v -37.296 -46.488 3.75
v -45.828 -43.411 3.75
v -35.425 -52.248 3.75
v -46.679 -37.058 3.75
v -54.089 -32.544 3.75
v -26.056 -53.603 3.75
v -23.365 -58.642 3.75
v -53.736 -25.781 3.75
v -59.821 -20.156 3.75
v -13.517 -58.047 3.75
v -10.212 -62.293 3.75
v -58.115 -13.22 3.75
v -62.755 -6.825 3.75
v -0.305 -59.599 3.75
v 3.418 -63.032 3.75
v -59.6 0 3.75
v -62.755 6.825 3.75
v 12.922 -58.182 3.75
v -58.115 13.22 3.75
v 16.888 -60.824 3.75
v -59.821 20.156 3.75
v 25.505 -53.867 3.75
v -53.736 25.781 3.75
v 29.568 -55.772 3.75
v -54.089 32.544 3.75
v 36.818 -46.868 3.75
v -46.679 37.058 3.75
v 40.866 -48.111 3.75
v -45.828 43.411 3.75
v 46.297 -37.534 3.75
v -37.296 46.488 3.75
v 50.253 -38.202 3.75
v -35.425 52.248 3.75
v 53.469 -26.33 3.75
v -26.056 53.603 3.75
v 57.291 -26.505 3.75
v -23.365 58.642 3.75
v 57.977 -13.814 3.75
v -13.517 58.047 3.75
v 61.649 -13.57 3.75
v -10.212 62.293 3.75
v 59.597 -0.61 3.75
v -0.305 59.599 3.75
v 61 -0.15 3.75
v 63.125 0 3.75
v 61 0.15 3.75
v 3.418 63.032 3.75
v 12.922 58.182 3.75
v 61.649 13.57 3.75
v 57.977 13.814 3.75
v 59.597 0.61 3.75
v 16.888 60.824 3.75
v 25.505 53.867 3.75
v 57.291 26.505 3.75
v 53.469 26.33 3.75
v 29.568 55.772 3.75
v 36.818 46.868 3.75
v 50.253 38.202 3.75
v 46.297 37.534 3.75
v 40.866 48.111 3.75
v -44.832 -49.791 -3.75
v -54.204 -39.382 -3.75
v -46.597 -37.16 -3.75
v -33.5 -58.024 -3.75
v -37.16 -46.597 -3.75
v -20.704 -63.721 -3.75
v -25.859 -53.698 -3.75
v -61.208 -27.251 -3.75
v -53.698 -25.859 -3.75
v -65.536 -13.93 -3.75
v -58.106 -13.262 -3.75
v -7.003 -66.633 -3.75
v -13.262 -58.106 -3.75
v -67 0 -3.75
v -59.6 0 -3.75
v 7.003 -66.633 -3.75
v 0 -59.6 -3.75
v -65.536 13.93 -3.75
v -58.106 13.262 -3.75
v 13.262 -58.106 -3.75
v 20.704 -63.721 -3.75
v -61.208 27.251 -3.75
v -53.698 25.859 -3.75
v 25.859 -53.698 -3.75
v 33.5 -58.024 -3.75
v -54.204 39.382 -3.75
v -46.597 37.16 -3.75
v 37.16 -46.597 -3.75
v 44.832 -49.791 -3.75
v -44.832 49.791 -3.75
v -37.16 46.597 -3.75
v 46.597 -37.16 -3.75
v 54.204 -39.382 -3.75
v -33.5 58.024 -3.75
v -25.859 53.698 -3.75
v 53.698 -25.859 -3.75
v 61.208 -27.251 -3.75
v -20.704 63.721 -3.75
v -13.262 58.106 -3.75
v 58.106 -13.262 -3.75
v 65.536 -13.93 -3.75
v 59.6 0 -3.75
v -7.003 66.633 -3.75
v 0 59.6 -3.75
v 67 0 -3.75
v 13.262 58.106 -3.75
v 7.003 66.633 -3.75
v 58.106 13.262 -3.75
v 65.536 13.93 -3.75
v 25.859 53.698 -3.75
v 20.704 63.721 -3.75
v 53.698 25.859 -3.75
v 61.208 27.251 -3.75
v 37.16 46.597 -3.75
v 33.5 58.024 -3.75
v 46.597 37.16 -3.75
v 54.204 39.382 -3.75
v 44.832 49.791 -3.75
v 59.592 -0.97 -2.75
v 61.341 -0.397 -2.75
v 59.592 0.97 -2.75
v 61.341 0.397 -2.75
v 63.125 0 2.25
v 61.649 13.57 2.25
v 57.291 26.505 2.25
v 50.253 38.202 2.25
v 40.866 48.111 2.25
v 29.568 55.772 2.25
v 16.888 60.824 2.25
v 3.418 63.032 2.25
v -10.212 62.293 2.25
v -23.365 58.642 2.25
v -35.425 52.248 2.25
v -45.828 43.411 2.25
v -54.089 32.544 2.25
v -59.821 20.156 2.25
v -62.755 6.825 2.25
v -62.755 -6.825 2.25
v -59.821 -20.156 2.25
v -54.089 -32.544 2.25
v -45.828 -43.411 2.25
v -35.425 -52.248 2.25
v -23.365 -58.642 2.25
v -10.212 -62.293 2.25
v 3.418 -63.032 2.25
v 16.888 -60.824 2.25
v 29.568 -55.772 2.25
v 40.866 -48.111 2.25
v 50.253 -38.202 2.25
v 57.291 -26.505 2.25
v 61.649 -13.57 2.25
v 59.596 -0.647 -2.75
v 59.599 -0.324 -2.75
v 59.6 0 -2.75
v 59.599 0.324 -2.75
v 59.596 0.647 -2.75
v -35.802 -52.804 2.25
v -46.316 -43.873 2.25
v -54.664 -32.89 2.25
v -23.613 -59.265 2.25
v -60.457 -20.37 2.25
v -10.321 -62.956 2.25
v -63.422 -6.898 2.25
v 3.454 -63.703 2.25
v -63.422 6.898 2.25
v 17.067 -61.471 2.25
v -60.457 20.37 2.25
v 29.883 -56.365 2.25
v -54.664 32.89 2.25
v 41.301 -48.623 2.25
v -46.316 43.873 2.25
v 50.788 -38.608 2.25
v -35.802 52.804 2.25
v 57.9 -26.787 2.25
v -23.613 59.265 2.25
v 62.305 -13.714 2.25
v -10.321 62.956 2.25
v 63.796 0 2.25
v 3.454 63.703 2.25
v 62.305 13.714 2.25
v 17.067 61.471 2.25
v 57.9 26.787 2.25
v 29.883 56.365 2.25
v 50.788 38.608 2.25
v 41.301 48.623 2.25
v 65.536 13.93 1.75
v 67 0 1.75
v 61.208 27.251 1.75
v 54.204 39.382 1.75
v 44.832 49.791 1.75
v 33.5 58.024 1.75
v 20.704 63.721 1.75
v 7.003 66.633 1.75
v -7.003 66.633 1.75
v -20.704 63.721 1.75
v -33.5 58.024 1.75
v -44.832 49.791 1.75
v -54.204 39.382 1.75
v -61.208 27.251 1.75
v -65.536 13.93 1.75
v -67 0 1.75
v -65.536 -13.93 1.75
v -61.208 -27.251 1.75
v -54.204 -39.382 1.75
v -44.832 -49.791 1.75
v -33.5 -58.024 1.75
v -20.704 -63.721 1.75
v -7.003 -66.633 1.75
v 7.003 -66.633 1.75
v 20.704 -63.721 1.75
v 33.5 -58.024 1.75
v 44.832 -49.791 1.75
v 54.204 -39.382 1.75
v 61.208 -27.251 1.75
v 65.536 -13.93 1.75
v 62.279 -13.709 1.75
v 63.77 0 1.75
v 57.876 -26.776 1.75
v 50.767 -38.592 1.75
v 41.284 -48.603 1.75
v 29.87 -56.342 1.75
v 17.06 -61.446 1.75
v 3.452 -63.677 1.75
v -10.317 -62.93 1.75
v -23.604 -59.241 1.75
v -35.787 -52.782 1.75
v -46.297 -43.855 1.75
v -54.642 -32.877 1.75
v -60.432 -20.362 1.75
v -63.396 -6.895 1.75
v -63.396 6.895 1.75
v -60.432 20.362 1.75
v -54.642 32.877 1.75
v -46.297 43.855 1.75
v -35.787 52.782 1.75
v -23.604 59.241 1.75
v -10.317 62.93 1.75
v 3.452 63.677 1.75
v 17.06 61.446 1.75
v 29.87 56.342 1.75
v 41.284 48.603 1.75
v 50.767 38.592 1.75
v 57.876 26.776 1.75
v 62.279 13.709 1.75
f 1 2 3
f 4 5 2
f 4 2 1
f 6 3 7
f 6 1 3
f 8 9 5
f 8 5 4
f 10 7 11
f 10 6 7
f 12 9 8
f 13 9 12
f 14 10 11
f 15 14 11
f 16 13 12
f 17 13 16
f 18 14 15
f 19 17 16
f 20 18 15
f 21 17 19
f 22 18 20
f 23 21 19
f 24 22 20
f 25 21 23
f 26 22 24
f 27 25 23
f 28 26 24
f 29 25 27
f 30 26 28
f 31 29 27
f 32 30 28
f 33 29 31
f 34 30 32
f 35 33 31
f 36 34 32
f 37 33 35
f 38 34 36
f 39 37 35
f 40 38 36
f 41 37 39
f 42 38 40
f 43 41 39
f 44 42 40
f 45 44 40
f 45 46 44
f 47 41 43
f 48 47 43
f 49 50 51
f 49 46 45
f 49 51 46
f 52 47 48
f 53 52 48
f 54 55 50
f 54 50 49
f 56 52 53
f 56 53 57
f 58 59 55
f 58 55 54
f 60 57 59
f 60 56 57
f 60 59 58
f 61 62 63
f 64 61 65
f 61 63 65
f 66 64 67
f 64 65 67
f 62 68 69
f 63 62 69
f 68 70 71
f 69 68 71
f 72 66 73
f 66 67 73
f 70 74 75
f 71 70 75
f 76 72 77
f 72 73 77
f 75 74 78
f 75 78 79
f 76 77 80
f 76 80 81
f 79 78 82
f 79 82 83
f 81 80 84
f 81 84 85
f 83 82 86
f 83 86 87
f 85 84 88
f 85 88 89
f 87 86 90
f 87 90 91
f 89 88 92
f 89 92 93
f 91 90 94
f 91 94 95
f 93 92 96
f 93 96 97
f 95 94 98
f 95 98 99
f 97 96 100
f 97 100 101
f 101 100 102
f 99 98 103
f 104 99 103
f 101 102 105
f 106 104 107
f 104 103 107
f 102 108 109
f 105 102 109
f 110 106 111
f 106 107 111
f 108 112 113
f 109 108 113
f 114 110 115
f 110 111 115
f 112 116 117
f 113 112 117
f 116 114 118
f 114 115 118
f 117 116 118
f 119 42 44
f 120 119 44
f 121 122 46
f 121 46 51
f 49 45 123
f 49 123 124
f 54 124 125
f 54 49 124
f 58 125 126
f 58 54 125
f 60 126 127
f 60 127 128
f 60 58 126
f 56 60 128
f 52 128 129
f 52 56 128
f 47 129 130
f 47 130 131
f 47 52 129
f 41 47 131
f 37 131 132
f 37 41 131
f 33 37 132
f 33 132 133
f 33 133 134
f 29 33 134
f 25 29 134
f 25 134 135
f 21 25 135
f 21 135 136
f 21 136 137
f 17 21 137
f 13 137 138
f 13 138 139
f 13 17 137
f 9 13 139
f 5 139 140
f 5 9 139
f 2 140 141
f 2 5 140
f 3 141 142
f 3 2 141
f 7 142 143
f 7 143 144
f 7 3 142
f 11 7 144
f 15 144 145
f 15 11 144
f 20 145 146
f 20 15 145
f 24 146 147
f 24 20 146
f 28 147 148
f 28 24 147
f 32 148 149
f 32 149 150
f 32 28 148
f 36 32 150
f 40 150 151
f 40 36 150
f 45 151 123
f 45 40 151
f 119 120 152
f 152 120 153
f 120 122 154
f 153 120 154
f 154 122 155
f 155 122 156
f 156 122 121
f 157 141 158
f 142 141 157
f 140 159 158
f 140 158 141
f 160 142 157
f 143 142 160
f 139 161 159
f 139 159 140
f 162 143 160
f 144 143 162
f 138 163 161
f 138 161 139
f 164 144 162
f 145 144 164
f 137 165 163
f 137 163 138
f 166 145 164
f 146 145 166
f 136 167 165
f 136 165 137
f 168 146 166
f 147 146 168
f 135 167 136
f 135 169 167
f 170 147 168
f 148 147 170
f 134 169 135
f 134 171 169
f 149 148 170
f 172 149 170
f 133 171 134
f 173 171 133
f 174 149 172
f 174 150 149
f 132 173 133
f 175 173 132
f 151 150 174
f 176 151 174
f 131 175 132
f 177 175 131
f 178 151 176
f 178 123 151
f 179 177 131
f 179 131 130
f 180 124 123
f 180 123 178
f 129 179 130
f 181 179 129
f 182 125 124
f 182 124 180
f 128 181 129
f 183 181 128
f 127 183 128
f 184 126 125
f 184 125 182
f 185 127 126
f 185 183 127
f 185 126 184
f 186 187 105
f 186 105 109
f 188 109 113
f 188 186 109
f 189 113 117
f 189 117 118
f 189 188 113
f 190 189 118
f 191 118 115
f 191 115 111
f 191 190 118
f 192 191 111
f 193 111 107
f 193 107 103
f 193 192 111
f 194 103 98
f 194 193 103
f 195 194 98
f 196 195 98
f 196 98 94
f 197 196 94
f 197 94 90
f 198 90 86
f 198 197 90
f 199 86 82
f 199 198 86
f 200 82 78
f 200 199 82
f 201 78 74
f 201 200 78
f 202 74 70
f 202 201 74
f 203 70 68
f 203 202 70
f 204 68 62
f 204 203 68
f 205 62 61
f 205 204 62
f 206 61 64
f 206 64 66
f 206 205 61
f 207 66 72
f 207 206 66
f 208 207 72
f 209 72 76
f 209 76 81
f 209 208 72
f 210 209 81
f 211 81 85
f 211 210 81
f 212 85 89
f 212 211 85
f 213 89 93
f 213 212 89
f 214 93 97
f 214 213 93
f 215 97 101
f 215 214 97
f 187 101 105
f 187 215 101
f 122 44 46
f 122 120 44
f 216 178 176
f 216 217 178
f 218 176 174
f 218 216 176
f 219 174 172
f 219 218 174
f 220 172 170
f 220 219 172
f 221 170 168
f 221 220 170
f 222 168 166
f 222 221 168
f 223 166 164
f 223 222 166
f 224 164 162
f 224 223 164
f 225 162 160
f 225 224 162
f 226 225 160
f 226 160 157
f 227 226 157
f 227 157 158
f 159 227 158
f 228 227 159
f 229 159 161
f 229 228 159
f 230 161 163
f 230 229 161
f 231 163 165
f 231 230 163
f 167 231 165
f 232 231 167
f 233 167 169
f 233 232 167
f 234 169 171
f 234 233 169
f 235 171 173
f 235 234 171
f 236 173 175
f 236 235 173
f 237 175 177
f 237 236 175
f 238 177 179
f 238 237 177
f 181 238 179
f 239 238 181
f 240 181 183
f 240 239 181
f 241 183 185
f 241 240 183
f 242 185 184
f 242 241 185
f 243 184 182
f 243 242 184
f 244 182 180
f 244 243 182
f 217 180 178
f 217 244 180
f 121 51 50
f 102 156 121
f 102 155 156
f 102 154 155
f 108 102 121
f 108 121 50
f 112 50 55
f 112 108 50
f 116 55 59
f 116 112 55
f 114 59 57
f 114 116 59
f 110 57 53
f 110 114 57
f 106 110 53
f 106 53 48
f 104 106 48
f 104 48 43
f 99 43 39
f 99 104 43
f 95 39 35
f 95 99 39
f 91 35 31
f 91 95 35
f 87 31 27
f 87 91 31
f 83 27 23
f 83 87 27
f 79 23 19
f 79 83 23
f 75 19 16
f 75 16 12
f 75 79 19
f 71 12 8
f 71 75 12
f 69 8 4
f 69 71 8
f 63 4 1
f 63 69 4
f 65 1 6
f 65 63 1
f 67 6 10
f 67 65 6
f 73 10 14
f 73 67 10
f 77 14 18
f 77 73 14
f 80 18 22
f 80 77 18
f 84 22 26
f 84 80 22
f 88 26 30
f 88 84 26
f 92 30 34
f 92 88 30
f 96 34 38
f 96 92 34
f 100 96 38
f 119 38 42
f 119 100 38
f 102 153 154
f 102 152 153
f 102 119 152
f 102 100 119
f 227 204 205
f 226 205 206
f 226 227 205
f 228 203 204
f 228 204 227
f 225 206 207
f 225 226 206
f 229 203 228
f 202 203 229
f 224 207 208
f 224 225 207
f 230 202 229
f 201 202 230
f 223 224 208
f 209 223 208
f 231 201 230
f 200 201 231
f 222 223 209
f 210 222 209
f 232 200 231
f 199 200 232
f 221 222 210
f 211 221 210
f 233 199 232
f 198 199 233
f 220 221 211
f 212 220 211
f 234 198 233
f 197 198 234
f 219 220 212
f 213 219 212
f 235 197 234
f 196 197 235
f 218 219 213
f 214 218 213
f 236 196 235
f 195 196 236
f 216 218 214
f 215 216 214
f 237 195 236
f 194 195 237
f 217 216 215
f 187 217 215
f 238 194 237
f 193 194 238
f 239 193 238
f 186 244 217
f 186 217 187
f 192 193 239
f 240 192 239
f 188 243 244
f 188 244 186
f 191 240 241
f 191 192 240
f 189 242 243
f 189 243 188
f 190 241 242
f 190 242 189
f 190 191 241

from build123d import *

# Parameters (mm, degrees)
F0_R        = 67
F0_R_2      = 59.6
F1_DEPTH    = 3.75
F2_R        = 63.875
F2_R_2      = 63.125
F3_DEPTH    = 1.5
F3_FACE_R   = 67
F3_FACE_R_2 = 63.875
F4_DEPTH    = 2
F4_TAPER    = -3
F7_DEPTH    = 6.5
F7_TAPER    = -3


# Not quite as in the source:
# - a feature of the source that left no trace in its solid (it failed there, or was rolled back) is left out


with BuildPart() as f1:
    # F0 (on Top) → F1 (new body, symmetric)
    with BuildSketch(Plane.XY):
        Circle(F0_R)
        Circle(F0_R_2, mode=Mode.SUBTRACT)
    extrude(amount=F1_DEPTH, both=True)

    # F2 (on face) → F3 (cut)
    with BuildSketch(Plane.XY.offset(3.75)):
        Circle(F2_R)
        Circle(F2_R_2, mode=Mode.SUBTRACT)
    extrude(amount=-F3_DEPTH, mode=Mode.SUBTRACT)

    # F3_face (on face) → F4 (cut)
    with BuildSketch(Plane.XY.offset(3.75)):
        Circle(F3_FACE_R)
        Circle(F3_FACE_R_2, mode=Mode.SUBTRACT)
    extrude(amount=-F4_DEPTH, taper=F4_TAPER, mode=Mode.SUBTRACT)

    # F6 (on face) → F7 (cut)
    with BuildSketch(Plane.XY.offset(3.75)):
        Polygon((61, 0.15), (59.4, 0.675), (59.4, -0.675), (61, -0.15), align=None)
    extrude(amount=-F7_DEPTH, taper=F7_TAPER, mode=Mode.SUBTRACT)


solid = f1.part
